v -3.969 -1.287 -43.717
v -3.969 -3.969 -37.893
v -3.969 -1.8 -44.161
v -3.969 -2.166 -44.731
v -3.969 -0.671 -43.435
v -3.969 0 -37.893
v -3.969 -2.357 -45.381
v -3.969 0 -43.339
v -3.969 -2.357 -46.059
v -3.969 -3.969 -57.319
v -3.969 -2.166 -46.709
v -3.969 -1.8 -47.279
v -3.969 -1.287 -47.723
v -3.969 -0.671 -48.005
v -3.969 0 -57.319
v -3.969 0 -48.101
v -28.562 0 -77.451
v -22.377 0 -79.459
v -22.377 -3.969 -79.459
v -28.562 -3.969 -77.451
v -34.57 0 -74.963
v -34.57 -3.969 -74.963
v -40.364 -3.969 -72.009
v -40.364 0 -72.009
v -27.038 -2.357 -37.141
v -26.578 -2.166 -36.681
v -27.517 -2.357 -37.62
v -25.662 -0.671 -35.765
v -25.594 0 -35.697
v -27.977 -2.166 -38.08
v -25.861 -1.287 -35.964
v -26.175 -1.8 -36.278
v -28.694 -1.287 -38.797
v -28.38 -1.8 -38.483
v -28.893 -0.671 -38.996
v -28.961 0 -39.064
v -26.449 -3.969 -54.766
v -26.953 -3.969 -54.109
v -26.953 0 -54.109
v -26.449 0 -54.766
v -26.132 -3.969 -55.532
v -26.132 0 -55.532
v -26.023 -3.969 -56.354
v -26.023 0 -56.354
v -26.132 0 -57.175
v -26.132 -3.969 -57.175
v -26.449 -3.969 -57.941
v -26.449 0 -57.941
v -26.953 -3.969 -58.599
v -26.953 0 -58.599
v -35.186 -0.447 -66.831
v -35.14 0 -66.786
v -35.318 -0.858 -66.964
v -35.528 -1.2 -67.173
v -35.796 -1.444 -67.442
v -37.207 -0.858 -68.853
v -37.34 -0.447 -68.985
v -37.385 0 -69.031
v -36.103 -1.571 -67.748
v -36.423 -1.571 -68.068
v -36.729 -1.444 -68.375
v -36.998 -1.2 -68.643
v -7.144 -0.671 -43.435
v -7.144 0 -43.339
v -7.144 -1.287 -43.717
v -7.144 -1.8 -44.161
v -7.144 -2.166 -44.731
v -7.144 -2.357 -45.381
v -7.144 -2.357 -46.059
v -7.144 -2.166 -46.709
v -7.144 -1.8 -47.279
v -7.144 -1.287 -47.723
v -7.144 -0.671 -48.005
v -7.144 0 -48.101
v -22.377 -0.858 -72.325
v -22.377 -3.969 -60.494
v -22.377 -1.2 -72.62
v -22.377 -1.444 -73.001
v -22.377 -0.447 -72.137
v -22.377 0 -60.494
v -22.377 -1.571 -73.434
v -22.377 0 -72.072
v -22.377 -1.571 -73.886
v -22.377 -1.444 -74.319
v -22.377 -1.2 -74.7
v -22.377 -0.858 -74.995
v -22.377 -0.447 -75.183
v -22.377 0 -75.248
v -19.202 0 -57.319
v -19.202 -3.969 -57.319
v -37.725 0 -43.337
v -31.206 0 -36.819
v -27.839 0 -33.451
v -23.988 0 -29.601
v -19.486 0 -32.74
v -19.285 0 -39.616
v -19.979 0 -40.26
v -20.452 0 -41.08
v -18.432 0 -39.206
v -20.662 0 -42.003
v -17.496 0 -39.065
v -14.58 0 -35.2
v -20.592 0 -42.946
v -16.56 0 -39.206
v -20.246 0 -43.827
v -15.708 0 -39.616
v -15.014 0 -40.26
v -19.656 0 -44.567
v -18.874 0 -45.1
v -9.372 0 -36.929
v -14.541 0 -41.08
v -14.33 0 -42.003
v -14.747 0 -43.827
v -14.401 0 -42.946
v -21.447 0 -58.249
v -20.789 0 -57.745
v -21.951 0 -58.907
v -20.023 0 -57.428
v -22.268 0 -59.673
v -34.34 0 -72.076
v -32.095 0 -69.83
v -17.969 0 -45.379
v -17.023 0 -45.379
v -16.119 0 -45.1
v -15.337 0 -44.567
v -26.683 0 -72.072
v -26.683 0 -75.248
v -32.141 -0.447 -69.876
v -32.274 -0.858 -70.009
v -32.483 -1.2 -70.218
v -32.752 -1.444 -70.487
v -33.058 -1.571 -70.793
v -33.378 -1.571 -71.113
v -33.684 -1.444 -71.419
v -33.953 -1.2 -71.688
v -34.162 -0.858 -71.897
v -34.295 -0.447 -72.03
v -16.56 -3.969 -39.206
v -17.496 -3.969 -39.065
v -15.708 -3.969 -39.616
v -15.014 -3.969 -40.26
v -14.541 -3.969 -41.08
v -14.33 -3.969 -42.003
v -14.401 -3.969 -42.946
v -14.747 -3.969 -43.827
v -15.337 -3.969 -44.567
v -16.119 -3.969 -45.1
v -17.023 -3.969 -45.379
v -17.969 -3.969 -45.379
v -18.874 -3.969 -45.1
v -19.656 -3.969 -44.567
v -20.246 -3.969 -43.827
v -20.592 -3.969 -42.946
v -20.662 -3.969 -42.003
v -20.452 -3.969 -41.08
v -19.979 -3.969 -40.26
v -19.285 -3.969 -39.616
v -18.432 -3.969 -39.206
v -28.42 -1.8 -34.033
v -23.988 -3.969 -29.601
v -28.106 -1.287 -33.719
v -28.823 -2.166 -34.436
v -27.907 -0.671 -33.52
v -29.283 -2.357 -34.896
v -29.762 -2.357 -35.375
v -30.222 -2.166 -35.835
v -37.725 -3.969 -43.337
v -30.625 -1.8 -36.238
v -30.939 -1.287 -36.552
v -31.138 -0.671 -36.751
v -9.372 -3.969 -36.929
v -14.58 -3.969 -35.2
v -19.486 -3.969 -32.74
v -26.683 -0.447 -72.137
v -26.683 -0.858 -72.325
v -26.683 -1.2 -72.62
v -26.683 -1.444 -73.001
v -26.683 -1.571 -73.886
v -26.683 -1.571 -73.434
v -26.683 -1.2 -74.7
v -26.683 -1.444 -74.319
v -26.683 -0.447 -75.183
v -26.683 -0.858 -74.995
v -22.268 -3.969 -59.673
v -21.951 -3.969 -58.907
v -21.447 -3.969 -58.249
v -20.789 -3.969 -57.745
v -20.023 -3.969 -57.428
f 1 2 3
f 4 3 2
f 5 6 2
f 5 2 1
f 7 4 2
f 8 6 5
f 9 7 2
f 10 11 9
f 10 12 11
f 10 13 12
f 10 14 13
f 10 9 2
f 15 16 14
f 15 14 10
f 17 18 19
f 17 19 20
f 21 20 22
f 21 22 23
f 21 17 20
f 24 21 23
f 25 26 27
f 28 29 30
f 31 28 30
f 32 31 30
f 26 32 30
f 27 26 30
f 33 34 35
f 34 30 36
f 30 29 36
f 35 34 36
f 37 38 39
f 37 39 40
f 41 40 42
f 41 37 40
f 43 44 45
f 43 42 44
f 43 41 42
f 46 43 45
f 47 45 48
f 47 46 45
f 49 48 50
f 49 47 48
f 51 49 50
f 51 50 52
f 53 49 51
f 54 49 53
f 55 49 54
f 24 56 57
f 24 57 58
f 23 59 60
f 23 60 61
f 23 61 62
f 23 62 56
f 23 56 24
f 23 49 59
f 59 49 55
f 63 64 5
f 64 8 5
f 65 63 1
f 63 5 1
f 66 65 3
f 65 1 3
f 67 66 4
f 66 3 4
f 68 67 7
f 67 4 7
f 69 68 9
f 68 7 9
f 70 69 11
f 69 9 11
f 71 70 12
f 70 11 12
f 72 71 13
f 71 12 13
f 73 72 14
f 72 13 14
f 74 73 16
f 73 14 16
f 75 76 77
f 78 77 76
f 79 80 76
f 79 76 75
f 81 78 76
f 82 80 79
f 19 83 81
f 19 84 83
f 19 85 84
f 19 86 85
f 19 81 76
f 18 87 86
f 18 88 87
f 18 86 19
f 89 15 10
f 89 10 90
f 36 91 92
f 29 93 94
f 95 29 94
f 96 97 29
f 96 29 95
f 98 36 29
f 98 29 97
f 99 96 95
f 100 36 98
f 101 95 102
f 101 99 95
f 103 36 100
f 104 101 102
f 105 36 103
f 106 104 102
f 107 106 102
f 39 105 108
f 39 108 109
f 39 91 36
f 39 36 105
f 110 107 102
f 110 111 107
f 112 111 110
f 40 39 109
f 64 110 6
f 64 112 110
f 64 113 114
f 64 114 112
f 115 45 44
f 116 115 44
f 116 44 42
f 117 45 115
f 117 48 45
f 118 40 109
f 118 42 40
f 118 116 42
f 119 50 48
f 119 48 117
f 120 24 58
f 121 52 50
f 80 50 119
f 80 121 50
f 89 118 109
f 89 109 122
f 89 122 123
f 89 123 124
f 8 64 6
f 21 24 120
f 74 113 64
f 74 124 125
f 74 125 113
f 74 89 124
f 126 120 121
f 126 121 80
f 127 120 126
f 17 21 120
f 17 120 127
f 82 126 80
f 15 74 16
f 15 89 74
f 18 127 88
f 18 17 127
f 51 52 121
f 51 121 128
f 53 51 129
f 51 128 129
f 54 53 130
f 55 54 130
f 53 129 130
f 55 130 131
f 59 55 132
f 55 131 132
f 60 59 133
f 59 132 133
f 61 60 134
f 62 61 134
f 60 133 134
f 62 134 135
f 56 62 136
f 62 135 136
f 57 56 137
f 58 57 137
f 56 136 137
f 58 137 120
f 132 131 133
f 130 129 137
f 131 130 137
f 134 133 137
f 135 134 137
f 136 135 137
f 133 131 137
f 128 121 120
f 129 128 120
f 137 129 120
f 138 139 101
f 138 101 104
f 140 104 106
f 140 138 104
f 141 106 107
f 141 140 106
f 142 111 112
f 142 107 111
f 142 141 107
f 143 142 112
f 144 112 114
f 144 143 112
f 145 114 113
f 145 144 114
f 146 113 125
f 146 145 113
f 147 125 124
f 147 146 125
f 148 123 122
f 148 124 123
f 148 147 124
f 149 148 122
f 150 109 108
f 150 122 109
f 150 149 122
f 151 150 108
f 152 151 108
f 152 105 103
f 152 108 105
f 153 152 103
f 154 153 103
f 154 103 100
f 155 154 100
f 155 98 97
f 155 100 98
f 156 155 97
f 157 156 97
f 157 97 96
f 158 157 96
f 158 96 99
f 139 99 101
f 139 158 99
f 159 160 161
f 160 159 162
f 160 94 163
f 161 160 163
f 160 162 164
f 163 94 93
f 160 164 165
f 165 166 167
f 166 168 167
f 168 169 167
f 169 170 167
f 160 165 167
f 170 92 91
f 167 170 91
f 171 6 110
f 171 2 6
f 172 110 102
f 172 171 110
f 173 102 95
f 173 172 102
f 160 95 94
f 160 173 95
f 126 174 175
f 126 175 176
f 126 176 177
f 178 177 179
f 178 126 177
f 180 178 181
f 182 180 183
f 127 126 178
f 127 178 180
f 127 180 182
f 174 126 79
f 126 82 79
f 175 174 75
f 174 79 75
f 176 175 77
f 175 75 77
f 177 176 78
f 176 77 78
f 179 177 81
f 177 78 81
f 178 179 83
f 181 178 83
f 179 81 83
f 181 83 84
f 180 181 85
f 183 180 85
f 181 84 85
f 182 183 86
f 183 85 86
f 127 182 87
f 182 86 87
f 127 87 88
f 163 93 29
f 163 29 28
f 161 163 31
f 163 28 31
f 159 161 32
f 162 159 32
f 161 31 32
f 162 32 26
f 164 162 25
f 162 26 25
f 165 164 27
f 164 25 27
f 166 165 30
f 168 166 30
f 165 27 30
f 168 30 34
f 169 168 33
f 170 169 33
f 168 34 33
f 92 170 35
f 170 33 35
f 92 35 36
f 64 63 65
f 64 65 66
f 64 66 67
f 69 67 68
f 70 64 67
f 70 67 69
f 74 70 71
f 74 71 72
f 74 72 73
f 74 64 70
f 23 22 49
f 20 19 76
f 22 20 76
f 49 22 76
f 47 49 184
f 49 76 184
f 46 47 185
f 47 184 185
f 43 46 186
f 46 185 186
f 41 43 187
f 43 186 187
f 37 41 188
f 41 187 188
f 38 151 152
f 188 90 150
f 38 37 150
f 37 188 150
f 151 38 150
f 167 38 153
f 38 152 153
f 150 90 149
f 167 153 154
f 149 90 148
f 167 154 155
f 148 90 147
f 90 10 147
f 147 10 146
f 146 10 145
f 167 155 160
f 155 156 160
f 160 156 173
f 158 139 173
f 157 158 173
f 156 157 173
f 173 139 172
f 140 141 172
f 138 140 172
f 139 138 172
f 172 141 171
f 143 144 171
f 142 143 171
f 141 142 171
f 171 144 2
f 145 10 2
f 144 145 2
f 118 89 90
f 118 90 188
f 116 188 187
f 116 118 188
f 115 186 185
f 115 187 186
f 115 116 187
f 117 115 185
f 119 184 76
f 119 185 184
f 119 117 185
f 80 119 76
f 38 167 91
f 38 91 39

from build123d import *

# Parameters (mm, degrees)
SKETCH1_R                   = 82.55
BASE_EXTRUDE_DEPTH          = 3.96875
WHEEL_SHAPE_CUT_DEPTH       = 117.810769951
RELIEF_FILLET_R             = 3.175
TOLERANCE_CUT_DEPTH         = 117.810769951
CUT_START                   = -3.96875
CUT_PATTERN_DEPTH           = 7.9375
SKETCH3_R                   = 1.5875
WHEEL_AXLE_CUT_DEPTH        = 26.6827
WHEEL_AXLE_PATTERN_COUNT    = 8
SKETCH5_R                   = 82.55
SHELL_CUT_DEPTH             = 113.442536881
SKETCH7_W                   = 7.9375
SKETCH7_H                   = 63.330582695
IDLER_CUT_DEPTH             = 113.442536881
SKETCH9_R                   = 2.38125
IDLER_AXLE_CUT_DEPTH        = 7.14375
IDLER_PATTERN_COUNT         = 8
MAIN_GEAR_CUT_DEPTH         = 113.442536881
MAIN_GEAR_CUT_DEPTH_BACK    = 113.442536881
SKETCH8_R                   = 38.1
SCREW_ACCESS_CUT_DEPTH      = 113.442536881
SCREW_ACCESS_CUT_DEPTH_BACK = 113.442536881
SKETCH17_R                  = 3.175


# Read off the part's stored shape, not the designer's step: Cut Pattern
with BuildPart() as part:
    # Sketch1 → Base Extrude (new, symmetric)
    with BuildSketch(Plane(origin=(0, 0, 0), x_dir=(1, 0, 0), z_dir=(0, 1, 0))):
        with Locations(Location((0, 0, 0), (0, 0, 270))):
            Circle(SKETCH1_R)
    extrude(amount=BASE_EXTRUDE_DEPTH, both=True)

    # Sketch2 → Wheel Shape Cut (cut, symmetric)
    with BuildSketch(Plane(origin=(0, 0, 0), x_dir=(1, 0, 0), z_dir=(0, 1, 0))):
        with BuildLine():
            Line((-21.919482915, 86.15536123), (-21.919482915, 61.16463877))
            ThreePointArc((-21.919482915, 61.16463877), (0, 58.42), (21.919482915, 61.16463877))
            Line((21.919482915, 61.16463877), (21.919482915, 86.15536123))
            ThreePointArc((21.919482915, 86.15536123), (0, 88.9), (-21.919482915, 86.15536123))
        make_face()
    extrude(amount=WHEEL_SHAPE_CUT_DEPTH, both=True, mode=Mode.SUBTRACT)

    # Relief Fillet
    relief_fillet_edges = [part.edges().sort_by_distance(p)[0] for p in [
        (-21.919482915, 0, -61.16463877),
        (21.919482915, 0, -61.16463877),
    ]]
    fillet(relief_fillet_edges, radius=RELIEF_FILLET_R)

    # Sketch16 → Tolerance Cut (cut, symmetric)
    with BuildSketch(Plane(origin=(0, 0, 0), x_dir=(1, 0, 0), z_dir=(0, 1, 0))):
        with BuildLine():
            Line((19.201682915, 57.319417305), (-19.201682915, 57.319417305))
            ThreePointArc((-19.201682915, 57.319417305), (-21.446746945, 58.249353274), (-22.376682915, 60.494417305))
            Line((-22.376682915, 60.494417305), (-22.376682915, 79.459339047))
            ThreePointArc((-22.376682915, 79.459339047), (-22.148174425, 79.523335378), (-21.919482915, 79.586674568))
            Line((-21.919482915, 79.586674568), (-21.919482915, 63.669417305))
            ThreePointArc((-21.919482915, 63.669417305), (-21.222873253, 61.684925851), (-19.438723023, 60.571247575))
            ThreePointArc((-19.438723023, 60.571247575), (0, 58.42), (19.438723023, 60.571247575))
            ThreePointArc((19.438723023, 60.571247575), (21.222873253, 61.684925851), (21.919482915, 63.669417305))
            Line((21.919482915, 63.669417305), (21.919482915, 79.586674568))
            ThreePointArc((21.919482915, 79.586674568), (22.148174425, 79.523335378), (22.376682915, 79.459339047))
            Line((22.376682915, 79.459339047), (22.376682915, 60.494417305))
            ThreePointArc((22.376682915, 60.494417305), (21.446746945, 58.249353274), (19.201682915, 57.319417305))
        make_face()
    extrude(amount=TOLERANCE_CUT_DEPTH, both=True, mode=Mode.SUBTRACT)

    # Cut Pattern outline → Cut Pattern (cut)
    with BuildSketch(Plane(origin=(0, 0, 0), x_dir=(1, 0, 0), z_dir=(0, 1, 0)).offset(CUT_START)):
        with BuildLine():
            ThreePointArc((-19.201682915, -57.319417305), (-21.446746945, -58.249353275), (-22.376682915, -60.494417305))
            Line((-22.376682915, -60.494417305), (-22.376682915, -79.459339047))
            ThreePointArc((-22.376682915, -79.459339047), (0, -82.55), (22.376682915, -79.459339047))
            Line((22.376682915, -79.459339047), (22.376682915, -60.494417305))
            ThreePointArc((22.376682915, -60.494417305), (21.446746945, -58.249353275), (19.201682915, -57.319417305))
            Line((19.201682915, -57.319417305), (-19.201682915, -57.319417305))
        make_face()
        with BuildLine():
            Line((58.598716929, 26.953308471), (72.008941698, 40.363533239))
            ThreePointArc((72.008941698, 40.363533239), (58.371664787, 58.371664787), (40.363533239, 72.008941698))
            Line((40.363533239, 72.008941698), (26.953308471, 58.598716929))
            ThreePointArc((26.953308471, 58.598716929), (26.023372501, 56.353652899), (26.953308471, 54.108588869))
            Line((26.953308471, 54.108588869), (54.108588869, 26.953308471))
            ThreePointArc((54.108588869, 26.953308471), (56.353652899, 26.023372501), (58.598716929, 26.953308471))
        make_face()
        with BuildLine():
            Line((60.494417305, -22.376682915), (79.459339047, -22.376682915))
            ThreePointArc((79.459339047, -22.376682915), (82.55, 0), (79.459339047, 22.376682915))
            Line((79.459339047, 22.376682915), (60.494417305, 22.376682915))
            ThreePointArc((60.494417305, 22.376682915), (58.249353275, 21.446746945), (57.319417305, 19.201682915))
            Line((57.319417305, 19.201682915), (57.319417305, -19.201682915))
            ThreePointArc((57.319417305, -19.201682915), (58.249353275, -21.446746945), (60.494417305, -22.376682915))
        make_face()
        with BuildLine():
            Line((26.953308471, -58.598716929), (40.363533239, -72.008941698))
            ThreePointArc((40.363533239, -72.008941698), (58.371664787, -58.371664787), (72.008941698, -40.363533239))
            Line((72.008941698, -40.363533239), (58.598716929, -26.953308471))
            ThreePointArc((58.598716929, -26.953308471), (56.353652899, -26.023372501), (54.108588869, -26.953308471))
            Line((54.108588869, -26.953308471), (26.953308471, -54.108588869))
            ThreePointArc((26.953308471, -54.108588869), (26.023372501, -56.353652899), (26.953308471, -58.598716929))
        make_face()
        with BuildLine():
            ThreePointArc((-40.363533239, 72.008941698), (-58.371664787, 58.371664787), (-72.008941698, 40.363533239))
            Line((-72.008941698, 40.363533239), (-58.598716929, 26.953308471))
            ThreePointArc((-58.598716929, 26.953308471), (-56.353652899, 26.023372501), (-54.108588869, 26.953308471))
            Line((-54.108588869, 26.953308471), (-26.953308471, 54.108588869))
            ThreePointArc((-26.953308471, 54.108588869), (-26.023372501, 56.353652899), (-26.953308471, 58.598716929))
            Line((-26.953308471, 58.598716929), (-40.363533239, 72.008941698))
        make_face()
        with BuildLine():
            ThreePointArc((-79.459339047, 22.376682915), (-82.55, 0), (-79.459339047, -22.376682915))
            Line((-79.459339047, -22.376682915), (-60.494417305, -22.376682915))
            ThreePointArc((-60.494417305, -22.376682915), (-58.249353275, -21.446746945), (-57.319417305, -19.201682915))
            Line((-57.319417305, -19.201682915), (-57.319417305, 19.201682915))
            ThreePointArc((-57.319417305, 19.201682915), (-58.249353275, 21.446746945), (-60.494417305, 22.376682915))
            Line((-60.494417305, 22.376682915), (-79.459339047, 22.376682915))
        make_face()
        with BuildLine():
            ThreePointArc((-72.008941698, -40.363533239), (-58.371664787, -58.371664787), (-40.363533239, -72.008941698))
            Line((-40.363533239, -72.008941698), (-26.953308471, -58.598716929))
            ThreePointArc((-26.953308471, -58.598716929), (-26.023372501, -56.353652899), (-26.953308471, -54.108588869))
            Line((-26.953308471, -54.108588869), (-54.108588869, -26.953308471))
            ThreePointArc((-54.108588869, -26.953308471), (-56.353652899, -26.023372501), (-58.598716929, -26.953308471))
            Line((-58.598716929, -26.953308471), (-72.008941698, -40.363533239))
        make_face()
    extrude(amount=CUT_PATTERN_DEPTH, mode=Mode.SUBTRACT)

    # Sketch3 → Wheel Axle Cut (cut, symmetric)
    with BuildSketch(Plane(origin=(0, 0, 0), x_dir=(0, 0, -1), z_dir=(1, 0, 0))):
        with Locations((73.66, 0)):
            Circle(SKETCH3_R)
    wheel_axle_cut = extrude(amount=WHEEL_AXLE_CUT_DEPTH, both=True, mode=Mode.SUBTRACT)

    # Wheel Axle Pattern: Wheel Axle Cut ×8 about axis
    wheel_axle_pattern_axis = Axis((0, 0, 0), (0, 1, 0))
    for i in range(1, WHEEL_AXLE_PATTERN_COUNT):
        add(wheel_axle_cut.rotate(wheel_axle_pattern_axis, i * 360 / WHEEL_AXLE_PATTERN_COUNT), mode=Mode.SUBTRACT)

    # Sketch5 → Shell Cut (cut, through all)
    with BuildSketch(Plane(origin=(0, 0, 0), x_dir=(1, 0, 0), z_dir=(0, 1, 0))):
        Circle(SKETCH5_R)
    extrude(amount=SHELL_CUT_DEPTH, mode=Mode.SUBTRACT)

    # Sketch7 → Idler Cut (cut, symmetric)
    with BuildSketch(Plane(origin=(0, 0, 0), x_dir=(1, 0, 0), z_dir=(0, 1, 0))):
        with Locations((0, 57.234708653)):
            Rectangle(SKETCH7_W, SKETCH7_H)
    idler_cut = extrude(amount=IDLER_CUT_DEPTH, both=True, mode=Mode.SUBTRACT)

    # Sketch9 → Idler Axle Cut (cut, symmetric)
    with BuildSketch(Plane(origin=(0, 0, 0), x_dir=(0, 0, -1), z_dir=(1, 0, 0))):
        with Locations((45.72, 0)):
            Circle(SKETCH9_R)
    idler_axle_cut = extrude(amount=IDLER_AXLE_CUT_DEPTH, both=True, mode=Mode.SUBTRACT)

    # Idler Pattern: Idler Cut, Idler Axle Cut ×8 about axis
    idler_pattern_axis = Axis((0, 0, 0), (0, 1, 0))
    add([idler_cut.rotate(idler_pattern_axis, i * 360 / IDLER_PATTERN_COUNT) for i in range(1, IDLER_PATTERN_COUNT)], mode=Mode.SUBTRACT)
    add([idler_axle_cut.rotate(idler_pattern_axis, i * 360 / IDLER_PATTERN_COUNT) for i in range(1, IDLER_PATTERN_COUNT)], mode=Mode.SUBTRACT)

    # Sketch8 → Main Gear Cut (cut, two sides: drawn at the far end of the back side and taken through both)
    with BuildSketch(Plane(origin=(0, 0, 0), x_dir=(1, 0, 0), z_dir=(0, 1, 0)).offset(-MAIN_GEAR_CUT_DEPTH_BACK)):
        Circle(SKETCH8_R)
    extrude(amount=MAIN_GEAR_CUT_DEPTH + MAIN_GEAR_CUT_DEPTH_BACK, mode=Mode.SUBTRACT)


with BuildPart() as main_gear_cut_piece_1:
    # of the separate pieces the step leaves, piece 1, a body of its own (main_gear_cut_pieces)
    add(part.part.solids().sort_by_distance((-3.96875, 0, 43.33875))[0])


with BuildPart() as main_gear_cut_piece_2:
    # of the separate pieces the step leaves, piece 2, a body of its own (main_gear_cut_pieces)
    add(part.part.solids().sort_by_distance((79.459339047, 0, -22.376682915))[0])


with BuildPart() as main_gear_cut_piece_3:
    # of the separate pieces the step leaves, piece 3, a body of its own (main_gear_cut_pieces)
    add(part.part.solids().sort_by_distance((43.33875, 0, 3.96875))[0])


with BuildPart() as main_gear_cut_piece_4:
    # of the separate pieces the step leaves, piece 4, a body of its own (main_gear_cut_pieces)
    add(part.part.solids().sort_by_distance((-22.376682915, 0, -60.494417305))[0])


with BuildPart() as main_gear_cut_piece_5:
    # of the separate pieces the step leaves, piece 5, a body of its own (main_gear_cut_pieces)
    add(part.part.solids().sort_by_distance((23.987876644, 0, -29.60053672))[0])


with BuildPart() as main_gear_cut_piece_6:
    # of the separate pieces the step leaves, piece 6, a body of its own (main_gear_cut_pieces)
    add(part.part.solids().sort_by_distance((-29.60053672, 0, -23.987876644))[0])


with BuildPart() as main_gear_cut_piece_7:
    # of the separate pieces the step leaves, piece 7, a body of its own (main_gear_cut_pieces)
    add(part.part.solids().sort_by_distance((-33.451454051, 0, 27.838793975))[0])


with BuildPart() as main_gear_cut_piece_8:
    # of the separate pieces the step leaves, piece 8, a body of its own (main_gear_cut_pieces)
    add(part.part.solids().sort_by_distance((27.838793975, 0, 33.451454051))[0])


with BuildPart() as screw_access_cut_tool:
    # Sketch17 → Screw Access Cut (new, two sides: drawn at the far end of the back side and taken through both)
    with BuildSketch(Plane(origin=(0, 0, 0), x_dir=(1, 0, 0), z_dir=(0, 1, 0)).offset(-SCREW_ACCESS_CUT_DEPTH_BACK)):
        with Locations(Location((-17.496286528, 42.239772226, 0), (0, 0, 270))):
            Circle(SKETCH17_R)
        with Locations(Location((17.496286528, 42.239772226, 0), (0, 0, 270))):
            Circle(SKETCH17_R)
        with Locations(Location((42.239772226, 17.496286528, 0), (0, 0, 270))):
            Circle(SKETCH17_R)
        with Locations(Location((42.239772226, -17.496286528, 0), (0, 0, 270))):
            Circle(SKETCH17_R)
        with Locations(Location((17.496286528, -42.239772226, 0), (0, 0, 270))):
            Circle(SKETCH17_R)
        with Locations(Location((-17.496286528, -42.239772226, 0), (0, 0, 270))):
            Circle(SKETCH17_R)
        with Locations(Location((-42.239772226, -17.496286528, 0), (0, 0, 270))):
            Circle(SKETCH17_R)
        with Locations(Location((-42.239772226, 17.496286528, 0), (0, 0, 270))):
            Circle(SKETCH17_R)
    extrude(amount=SCREW_ACCESS_CUT_DEPTH + SCREW_ACCESS_CUT_DEPTH_BACK)


with BuildPart() as main_gear_cut_piece_1_1:
    add(main_gear_cut_piece_1.part)

    # Screw Access Cut: cut by screw_access_cut_tool
    add(screw_access_cut_tool.part, mode=Mode.SUBTRACT)


with BuildPart() as main_gear_cut_piece_2_1:
    add(main_gear_cut_piece_2.part)

    # Screw Access Cut: cut by screw_access_cut_tool
    add(screw_access_cut_tool.part, mode=Mode.SUBTRACT)


with BuildPart() as main_gear_cut_piece_3_1:
    add(main_gear_cut_piece_3.part)

    # Screw Access Cut: cut by screw_access_cut_tool
    add(screw_access_cut_tool.part, mode=Mode.SUBTRACT)


with BuildPart() as main_gear_cut_piece_4_1:
    add(main_gear_cut_piece_4.part)

    # Screw Access Cut: cut by screw_access_cut_tool
    add(screw_access_cut_tool.part, mode=Mode.SUBTRACT)


with BuildPart() as main_gear_cut_piece_5_1:
    add(main_gear_cut_piece_5.part)

    # Screw Access Cut: cut by screw_access_cut_tool
    add(screw_access_cut_tool.part, mode=Mode.SUBTRACT)


with BuildPart() as main_gear_cut_piece_6_1:
    add(main_gear_cut_piece_6.part)

    # Screw Access Cut: cut by screw_access_cut_tool
    add(screw_access_cut_tool.part, mode=Mode.SUBTRACT)


with BuildPart() as main_gear_cut_piece_7_1:
    add(main_gear_cut_piece_7.part)

    # Screw Access Cut: cut by screw_access_cut_tool
    add(screw_access_cut_tool.part, mode=Mode.SUBTRACT)


with BuildPart() as main_gear_cut_piece_8_1:
    add(main_gear_cut_piece_8.part)

    # Screw Access Cut: cut by screw_access_cut_tool
    add(screw_access_cut_tool.part, mode=Mode.SUBTRACT)


solid = main_gear_cut_piece_4_1.part
